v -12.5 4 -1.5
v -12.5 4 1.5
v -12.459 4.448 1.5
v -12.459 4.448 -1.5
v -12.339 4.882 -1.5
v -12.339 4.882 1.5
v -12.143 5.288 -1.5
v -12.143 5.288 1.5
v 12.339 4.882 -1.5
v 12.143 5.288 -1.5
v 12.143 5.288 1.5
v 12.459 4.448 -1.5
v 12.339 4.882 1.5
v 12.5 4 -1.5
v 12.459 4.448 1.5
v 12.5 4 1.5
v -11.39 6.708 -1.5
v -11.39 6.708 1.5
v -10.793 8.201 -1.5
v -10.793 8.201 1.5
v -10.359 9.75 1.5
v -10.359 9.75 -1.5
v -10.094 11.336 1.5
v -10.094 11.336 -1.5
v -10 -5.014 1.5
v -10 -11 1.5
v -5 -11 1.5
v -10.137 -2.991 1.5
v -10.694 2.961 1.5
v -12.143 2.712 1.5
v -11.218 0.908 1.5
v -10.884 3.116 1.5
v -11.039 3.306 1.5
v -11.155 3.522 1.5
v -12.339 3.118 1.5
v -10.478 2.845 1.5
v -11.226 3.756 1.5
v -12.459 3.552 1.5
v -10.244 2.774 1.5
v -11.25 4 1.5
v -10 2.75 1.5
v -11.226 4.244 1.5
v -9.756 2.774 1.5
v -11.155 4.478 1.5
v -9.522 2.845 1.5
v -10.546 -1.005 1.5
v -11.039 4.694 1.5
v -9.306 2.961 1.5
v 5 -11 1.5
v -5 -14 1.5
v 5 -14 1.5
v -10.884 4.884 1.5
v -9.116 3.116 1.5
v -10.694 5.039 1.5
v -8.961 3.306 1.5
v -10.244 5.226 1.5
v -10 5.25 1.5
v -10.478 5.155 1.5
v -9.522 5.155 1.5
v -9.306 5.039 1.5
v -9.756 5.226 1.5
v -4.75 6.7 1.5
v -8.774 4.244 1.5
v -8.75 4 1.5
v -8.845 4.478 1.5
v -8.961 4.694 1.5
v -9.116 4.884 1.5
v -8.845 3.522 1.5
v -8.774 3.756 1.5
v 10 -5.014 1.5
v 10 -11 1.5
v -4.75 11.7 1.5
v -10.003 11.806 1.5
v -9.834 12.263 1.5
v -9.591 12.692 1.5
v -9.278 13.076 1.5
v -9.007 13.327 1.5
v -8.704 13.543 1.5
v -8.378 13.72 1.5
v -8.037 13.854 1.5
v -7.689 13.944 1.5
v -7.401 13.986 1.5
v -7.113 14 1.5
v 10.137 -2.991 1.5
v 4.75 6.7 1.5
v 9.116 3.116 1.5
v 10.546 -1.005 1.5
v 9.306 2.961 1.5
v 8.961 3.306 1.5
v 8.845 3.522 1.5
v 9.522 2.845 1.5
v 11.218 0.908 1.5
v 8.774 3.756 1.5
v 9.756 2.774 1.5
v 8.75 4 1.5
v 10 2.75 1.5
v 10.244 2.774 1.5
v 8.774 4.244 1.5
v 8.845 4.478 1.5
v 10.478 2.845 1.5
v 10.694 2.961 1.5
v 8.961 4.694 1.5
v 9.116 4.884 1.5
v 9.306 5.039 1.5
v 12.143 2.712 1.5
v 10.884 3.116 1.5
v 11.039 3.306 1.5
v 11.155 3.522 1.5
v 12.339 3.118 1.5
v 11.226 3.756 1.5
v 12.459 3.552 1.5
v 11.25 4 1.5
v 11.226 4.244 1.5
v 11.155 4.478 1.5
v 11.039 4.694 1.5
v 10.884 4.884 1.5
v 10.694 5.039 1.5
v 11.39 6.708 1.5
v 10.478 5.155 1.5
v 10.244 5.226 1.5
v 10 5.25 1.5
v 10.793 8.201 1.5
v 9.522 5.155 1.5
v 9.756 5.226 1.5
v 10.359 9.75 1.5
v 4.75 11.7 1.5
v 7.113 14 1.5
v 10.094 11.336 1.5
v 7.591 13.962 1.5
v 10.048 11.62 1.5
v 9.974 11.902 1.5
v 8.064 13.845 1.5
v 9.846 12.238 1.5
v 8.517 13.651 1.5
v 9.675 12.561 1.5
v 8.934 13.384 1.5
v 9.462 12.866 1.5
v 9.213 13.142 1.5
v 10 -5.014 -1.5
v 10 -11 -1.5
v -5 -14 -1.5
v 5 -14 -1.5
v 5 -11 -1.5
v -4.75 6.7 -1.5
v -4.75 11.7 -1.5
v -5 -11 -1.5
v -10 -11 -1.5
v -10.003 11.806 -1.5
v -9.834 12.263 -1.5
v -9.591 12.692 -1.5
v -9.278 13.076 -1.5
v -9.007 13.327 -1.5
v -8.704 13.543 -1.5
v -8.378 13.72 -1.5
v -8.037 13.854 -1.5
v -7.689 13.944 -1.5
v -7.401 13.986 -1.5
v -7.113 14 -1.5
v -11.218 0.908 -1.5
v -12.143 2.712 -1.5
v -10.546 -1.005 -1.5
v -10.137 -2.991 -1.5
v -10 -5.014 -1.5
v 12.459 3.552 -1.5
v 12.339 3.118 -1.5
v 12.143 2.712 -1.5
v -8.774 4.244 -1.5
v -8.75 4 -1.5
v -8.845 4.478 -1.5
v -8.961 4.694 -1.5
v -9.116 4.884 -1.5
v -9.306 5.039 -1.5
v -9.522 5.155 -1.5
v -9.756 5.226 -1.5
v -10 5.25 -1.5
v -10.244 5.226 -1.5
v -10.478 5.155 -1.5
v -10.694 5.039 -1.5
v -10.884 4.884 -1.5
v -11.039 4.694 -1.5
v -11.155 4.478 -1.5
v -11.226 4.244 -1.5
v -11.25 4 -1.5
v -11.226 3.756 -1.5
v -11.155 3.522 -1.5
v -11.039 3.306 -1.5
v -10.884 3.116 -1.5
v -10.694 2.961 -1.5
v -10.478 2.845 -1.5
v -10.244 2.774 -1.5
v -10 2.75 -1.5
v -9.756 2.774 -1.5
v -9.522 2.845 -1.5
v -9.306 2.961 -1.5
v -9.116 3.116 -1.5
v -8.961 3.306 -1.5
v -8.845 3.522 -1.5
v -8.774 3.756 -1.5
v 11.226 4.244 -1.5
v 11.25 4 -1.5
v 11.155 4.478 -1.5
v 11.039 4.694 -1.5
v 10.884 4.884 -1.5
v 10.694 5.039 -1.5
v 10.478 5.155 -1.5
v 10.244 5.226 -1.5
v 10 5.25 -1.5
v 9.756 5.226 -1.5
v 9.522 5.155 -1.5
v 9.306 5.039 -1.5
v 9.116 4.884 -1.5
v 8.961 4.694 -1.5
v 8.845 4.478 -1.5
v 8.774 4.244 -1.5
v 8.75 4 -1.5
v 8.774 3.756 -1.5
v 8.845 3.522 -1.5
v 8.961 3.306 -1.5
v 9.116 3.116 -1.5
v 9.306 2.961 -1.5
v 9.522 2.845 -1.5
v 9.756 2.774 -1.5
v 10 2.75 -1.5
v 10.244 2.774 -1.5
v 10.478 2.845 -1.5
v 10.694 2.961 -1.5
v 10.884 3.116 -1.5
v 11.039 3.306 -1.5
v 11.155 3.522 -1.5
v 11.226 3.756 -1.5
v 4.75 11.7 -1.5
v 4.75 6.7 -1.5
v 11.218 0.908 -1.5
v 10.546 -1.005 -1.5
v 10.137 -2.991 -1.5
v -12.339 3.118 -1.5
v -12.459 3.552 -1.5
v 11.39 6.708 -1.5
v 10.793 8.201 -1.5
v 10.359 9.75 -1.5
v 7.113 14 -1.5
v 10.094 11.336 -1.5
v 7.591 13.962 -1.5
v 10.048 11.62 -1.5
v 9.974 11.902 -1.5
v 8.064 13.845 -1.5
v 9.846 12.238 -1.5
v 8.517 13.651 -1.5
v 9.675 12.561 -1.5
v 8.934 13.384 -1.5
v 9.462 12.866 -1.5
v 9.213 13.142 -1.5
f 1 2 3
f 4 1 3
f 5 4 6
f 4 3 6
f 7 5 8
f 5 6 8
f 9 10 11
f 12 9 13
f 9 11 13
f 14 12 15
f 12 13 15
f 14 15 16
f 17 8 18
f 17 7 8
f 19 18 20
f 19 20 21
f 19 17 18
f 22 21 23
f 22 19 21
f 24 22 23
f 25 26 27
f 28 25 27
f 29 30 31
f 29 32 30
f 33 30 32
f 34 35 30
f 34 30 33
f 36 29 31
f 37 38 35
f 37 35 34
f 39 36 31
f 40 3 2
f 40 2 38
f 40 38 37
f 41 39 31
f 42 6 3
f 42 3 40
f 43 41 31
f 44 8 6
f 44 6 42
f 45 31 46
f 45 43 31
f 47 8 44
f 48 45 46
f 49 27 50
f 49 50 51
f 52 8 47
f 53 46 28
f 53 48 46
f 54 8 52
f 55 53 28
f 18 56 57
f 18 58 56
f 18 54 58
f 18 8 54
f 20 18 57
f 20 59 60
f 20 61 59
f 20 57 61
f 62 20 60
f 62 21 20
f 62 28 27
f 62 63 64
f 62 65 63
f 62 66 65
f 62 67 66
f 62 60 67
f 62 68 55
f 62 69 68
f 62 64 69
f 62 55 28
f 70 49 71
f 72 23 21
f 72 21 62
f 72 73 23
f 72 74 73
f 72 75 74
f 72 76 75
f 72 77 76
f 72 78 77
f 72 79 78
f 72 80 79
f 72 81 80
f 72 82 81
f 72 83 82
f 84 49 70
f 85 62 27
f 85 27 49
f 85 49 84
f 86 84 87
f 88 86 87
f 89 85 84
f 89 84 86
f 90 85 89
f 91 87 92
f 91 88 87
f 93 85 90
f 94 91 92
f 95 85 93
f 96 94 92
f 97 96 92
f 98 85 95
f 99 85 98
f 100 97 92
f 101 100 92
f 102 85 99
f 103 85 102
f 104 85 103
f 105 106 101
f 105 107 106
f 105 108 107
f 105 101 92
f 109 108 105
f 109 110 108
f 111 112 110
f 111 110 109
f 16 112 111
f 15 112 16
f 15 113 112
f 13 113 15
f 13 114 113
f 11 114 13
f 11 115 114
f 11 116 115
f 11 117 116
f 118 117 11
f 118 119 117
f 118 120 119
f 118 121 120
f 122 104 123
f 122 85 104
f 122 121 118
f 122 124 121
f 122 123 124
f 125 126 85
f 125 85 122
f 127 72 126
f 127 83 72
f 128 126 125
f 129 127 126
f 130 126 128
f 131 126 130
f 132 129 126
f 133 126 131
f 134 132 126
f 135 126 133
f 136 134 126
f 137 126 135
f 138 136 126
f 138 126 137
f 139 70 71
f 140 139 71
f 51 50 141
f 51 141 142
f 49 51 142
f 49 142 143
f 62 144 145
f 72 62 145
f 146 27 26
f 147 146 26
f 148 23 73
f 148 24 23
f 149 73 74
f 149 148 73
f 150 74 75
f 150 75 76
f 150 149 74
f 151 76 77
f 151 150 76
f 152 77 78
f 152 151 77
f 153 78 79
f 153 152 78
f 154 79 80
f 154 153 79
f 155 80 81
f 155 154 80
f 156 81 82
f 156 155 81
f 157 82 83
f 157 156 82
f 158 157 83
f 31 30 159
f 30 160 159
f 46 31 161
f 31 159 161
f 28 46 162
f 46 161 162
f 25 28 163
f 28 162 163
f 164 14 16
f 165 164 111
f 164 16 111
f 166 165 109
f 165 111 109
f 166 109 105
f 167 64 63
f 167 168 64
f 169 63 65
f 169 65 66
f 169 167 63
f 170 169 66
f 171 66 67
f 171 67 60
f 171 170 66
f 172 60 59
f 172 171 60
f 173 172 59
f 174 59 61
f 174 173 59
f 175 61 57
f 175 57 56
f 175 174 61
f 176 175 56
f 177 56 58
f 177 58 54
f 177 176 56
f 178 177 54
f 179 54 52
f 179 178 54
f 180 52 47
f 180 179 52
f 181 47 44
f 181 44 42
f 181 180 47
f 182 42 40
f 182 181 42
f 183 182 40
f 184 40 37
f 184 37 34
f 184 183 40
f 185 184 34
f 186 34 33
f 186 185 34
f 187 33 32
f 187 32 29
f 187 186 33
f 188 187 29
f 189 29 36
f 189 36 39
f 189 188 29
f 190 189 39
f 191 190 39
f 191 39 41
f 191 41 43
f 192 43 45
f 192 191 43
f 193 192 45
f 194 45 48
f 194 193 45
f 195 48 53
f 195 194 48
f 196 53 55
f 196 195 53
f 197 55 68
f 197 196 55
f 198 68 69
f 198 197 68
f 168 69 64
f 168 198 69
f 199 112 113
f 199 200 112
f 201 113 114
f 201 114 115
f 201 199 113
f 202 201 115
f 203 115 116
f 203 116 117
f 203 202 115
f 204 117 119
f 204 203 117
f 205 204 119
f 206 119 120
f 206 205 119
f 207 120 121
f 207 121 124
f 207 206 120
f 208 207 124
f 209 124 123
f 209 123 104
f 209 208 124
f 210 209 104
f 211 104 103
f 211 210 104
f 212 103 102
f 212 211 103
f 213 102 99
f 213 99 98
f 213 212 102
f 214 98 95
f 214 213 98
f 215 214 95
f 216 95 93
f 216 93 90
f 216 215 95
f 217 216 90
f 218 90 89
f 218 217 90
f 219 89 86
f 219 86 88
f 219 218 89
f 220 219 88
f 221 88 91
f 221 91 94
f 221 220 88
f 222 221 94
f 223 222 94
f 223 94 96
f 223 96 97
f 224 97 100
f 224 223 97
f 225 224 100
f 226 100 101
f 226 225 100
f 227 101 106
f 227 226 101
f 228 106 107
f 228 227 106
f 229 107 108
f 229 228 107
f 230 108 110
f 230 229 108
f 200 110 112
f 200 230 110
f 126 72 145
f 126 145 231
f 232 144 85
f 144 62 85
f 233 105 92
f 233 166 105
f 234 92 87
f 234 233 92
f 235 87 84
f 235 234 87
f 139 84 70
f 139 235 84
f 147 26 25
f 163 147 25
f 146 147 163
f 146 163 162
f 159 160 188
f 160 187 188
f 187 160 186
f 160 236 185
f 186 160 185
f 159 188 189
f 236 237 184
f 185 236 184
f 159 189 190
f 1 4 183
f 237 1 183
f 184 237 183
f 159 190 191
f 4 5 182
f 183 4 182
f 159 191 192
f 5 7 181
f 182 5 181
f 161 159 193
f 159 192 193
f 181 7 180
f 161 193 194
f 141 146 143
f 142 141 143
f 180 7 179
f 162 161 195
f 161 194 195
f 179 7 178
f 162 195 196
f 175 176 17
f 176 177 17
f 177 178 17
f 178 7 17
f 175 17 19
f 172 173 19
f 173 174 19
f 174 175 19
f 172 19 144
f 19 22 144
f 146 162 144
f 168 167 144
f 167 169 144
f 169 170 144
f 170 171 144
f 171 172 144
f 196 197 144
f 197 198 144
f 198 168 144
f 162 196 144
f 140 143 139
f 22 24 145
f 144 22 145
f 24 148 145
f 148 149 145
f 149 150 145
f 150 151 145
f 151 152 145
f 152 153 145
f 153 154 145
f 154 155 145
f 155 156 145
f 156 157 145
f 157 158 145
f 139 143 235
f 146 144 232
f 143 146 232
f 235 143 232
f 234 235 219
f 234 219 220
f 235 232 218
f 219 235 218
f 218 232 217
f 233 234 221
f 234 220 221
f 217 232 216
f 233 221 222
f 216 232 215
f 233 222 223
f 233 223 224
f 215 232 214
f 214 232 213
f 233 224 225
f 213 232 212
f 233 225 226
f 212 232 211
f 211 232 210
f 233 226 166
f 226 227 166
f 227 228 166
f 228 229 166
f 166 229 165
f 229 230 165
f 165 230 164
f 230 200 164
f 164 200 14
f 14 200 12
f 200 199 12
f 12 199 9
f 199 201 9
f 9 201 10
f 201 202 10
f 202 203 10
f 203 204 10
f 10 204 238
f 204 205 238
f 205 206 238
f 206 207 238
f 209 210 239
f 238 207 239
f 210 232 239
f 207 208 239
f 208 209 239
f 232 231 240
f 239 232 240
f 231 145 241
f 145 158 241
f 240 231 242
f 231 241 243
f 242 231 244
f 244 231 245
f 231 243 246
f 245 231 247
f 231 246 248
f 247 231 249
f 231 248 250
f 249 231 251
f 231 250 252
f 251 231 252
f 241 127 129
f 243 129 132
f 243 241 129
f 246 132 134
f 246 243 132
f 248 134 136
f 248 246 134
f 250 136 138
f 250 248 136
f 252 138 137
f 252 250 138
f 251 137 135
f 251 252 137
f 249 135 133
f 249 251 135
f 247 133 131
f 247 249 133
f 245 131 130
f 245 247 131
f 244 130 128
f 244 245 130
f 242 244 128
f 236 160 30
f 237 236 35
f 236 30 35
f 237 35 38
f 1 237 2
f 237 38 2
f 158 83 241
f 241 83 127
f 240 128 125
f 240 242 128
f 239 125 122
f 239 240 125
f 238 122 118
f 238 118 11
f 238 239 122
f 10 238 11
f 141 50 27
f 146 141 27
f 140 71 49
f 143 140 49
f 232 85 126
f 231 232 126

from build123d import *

# Parameters (mm, degrees)
CROQUIS1_W              = 25
CROQUIS1_H              = 28
CROQUIS1_R              = 1.25
CROQUIS1_W_2            = 9.5
CROQUIS1_H_2            = 5
SALIENTE_EXTRUIR1_DEPTH = 1.5
CROQUIS2_W              = 2.5
CROQUIS2_H              = 3
CROQUIS2_W_2            = 5
CORTAR_EXTRUIR1_DEPTH   = 10
REDONDEO1_R             = 15
REDONDEO2_R             = 3


with BuildPart() as part:
    # Croquis1 → Saliente-Extruir1 (new, symmetric)
    with BuildSketch(Plane.XY):
        Rectangle(CROQUIS1_W, CROQUIS1_H)
        with Locations((-10, 4)):
            Circle(CROQUIS1_R, mode=Mode.SUBTRACT)
        with Locations((10, 4)):
            Circle(CROQUIS1_R, mode=Mode.SUBTRACT)
        with Locations((0, 9.2)):
            Rectangle(CROQUIS1_W_2, CROQUIS1_H_2, mode=Mode.SUBTRACT)
    extrude(amount=SALIENTE_EXTRUIR1_DEPTH, both=True)

    # Croquis2 → Cortar-Extruir1 (cut)
    with BuildSketch(Plane.XY.offset(1.5)):
        with Locations((-11.25, -12.5)):
            Rectangle(CROQUIS2_W, CROQUIS2_H)
        with Locations((-7.5, -12.5)):
            Rectangle(CROQUIS2_W_2, CROQUIS2_H)
        with Locations((7.5, -12.5)):
            Rectangle(CROQUIS2_W_2, CROQUIS2_H)
        with Locations((11.25, -12.5)):
            Rectangle(CROQUIS2_W, CROQUIS2_H)
        with BuildLine():
            Line((-12.5, -11), (-10, -11))
            Line((-10, -11), (-10, 1.5))
            ThreePointArc((-10, 1.5), (-11.767766953, 2.232233047), (-12.5, 4))
            Line((-12.5, 4), (-12.5, -11))
        make_face()
        with BuildLine():
            Line((10, 1.5), (10, -11))
            Line((10, -11), (12.5, -11))
            Line((12.5, -11), (12.5, 4))
            ThreePointArc((12.5, 4), (11.767766953, 2.232233047), (10, 1.5))
        make_face()
        with BuildLine():
            Line((12.5, 14), (10, 14))
            Line((10, 14), (10, 6.5))
            ThreePointArc((10, 6.5), (11.767766953, 5.767766953), (12.5, 4))
            Line((12.5, 4), (12.5, 14))
        make_face()
        with BuildLine():
            ThreePointArc((-12.5, 4), (-11.767766953, 5.767766953), (-10, 6.5))
            Line((-10, 6.5), (-10, 14))
            Line((-10, 14), (-12.5, 14))
            Line((-12.5, 14), (-12.5, 4))
        make_face()
    extrude(amount=-CORTAR_EXTRUIR1_DEPTH, mode=Mode.SUBTRACT)

    # Redondeo1
    redondeo1_edges = [part.edges().sort_by_distance(p)[0] for p in [
        (-10, 6.5, 0),
        (-10, 1.5, 0),
        (10, 1.5, 0),
        (10, 6.5, 0),
    ]]
    fillet(redondeo1_edges, radius=REDONDEO1_R)

    # Redondeo2
    redondeo2_edges = [part.edges().sort_by_distance(p)[0] for p in [
        (10, 14, 0),
        (-10, 14, 0),
    ]]
    fillet(redondeo2_edges, radius=REDONDEO2_R)


solid = part.part
